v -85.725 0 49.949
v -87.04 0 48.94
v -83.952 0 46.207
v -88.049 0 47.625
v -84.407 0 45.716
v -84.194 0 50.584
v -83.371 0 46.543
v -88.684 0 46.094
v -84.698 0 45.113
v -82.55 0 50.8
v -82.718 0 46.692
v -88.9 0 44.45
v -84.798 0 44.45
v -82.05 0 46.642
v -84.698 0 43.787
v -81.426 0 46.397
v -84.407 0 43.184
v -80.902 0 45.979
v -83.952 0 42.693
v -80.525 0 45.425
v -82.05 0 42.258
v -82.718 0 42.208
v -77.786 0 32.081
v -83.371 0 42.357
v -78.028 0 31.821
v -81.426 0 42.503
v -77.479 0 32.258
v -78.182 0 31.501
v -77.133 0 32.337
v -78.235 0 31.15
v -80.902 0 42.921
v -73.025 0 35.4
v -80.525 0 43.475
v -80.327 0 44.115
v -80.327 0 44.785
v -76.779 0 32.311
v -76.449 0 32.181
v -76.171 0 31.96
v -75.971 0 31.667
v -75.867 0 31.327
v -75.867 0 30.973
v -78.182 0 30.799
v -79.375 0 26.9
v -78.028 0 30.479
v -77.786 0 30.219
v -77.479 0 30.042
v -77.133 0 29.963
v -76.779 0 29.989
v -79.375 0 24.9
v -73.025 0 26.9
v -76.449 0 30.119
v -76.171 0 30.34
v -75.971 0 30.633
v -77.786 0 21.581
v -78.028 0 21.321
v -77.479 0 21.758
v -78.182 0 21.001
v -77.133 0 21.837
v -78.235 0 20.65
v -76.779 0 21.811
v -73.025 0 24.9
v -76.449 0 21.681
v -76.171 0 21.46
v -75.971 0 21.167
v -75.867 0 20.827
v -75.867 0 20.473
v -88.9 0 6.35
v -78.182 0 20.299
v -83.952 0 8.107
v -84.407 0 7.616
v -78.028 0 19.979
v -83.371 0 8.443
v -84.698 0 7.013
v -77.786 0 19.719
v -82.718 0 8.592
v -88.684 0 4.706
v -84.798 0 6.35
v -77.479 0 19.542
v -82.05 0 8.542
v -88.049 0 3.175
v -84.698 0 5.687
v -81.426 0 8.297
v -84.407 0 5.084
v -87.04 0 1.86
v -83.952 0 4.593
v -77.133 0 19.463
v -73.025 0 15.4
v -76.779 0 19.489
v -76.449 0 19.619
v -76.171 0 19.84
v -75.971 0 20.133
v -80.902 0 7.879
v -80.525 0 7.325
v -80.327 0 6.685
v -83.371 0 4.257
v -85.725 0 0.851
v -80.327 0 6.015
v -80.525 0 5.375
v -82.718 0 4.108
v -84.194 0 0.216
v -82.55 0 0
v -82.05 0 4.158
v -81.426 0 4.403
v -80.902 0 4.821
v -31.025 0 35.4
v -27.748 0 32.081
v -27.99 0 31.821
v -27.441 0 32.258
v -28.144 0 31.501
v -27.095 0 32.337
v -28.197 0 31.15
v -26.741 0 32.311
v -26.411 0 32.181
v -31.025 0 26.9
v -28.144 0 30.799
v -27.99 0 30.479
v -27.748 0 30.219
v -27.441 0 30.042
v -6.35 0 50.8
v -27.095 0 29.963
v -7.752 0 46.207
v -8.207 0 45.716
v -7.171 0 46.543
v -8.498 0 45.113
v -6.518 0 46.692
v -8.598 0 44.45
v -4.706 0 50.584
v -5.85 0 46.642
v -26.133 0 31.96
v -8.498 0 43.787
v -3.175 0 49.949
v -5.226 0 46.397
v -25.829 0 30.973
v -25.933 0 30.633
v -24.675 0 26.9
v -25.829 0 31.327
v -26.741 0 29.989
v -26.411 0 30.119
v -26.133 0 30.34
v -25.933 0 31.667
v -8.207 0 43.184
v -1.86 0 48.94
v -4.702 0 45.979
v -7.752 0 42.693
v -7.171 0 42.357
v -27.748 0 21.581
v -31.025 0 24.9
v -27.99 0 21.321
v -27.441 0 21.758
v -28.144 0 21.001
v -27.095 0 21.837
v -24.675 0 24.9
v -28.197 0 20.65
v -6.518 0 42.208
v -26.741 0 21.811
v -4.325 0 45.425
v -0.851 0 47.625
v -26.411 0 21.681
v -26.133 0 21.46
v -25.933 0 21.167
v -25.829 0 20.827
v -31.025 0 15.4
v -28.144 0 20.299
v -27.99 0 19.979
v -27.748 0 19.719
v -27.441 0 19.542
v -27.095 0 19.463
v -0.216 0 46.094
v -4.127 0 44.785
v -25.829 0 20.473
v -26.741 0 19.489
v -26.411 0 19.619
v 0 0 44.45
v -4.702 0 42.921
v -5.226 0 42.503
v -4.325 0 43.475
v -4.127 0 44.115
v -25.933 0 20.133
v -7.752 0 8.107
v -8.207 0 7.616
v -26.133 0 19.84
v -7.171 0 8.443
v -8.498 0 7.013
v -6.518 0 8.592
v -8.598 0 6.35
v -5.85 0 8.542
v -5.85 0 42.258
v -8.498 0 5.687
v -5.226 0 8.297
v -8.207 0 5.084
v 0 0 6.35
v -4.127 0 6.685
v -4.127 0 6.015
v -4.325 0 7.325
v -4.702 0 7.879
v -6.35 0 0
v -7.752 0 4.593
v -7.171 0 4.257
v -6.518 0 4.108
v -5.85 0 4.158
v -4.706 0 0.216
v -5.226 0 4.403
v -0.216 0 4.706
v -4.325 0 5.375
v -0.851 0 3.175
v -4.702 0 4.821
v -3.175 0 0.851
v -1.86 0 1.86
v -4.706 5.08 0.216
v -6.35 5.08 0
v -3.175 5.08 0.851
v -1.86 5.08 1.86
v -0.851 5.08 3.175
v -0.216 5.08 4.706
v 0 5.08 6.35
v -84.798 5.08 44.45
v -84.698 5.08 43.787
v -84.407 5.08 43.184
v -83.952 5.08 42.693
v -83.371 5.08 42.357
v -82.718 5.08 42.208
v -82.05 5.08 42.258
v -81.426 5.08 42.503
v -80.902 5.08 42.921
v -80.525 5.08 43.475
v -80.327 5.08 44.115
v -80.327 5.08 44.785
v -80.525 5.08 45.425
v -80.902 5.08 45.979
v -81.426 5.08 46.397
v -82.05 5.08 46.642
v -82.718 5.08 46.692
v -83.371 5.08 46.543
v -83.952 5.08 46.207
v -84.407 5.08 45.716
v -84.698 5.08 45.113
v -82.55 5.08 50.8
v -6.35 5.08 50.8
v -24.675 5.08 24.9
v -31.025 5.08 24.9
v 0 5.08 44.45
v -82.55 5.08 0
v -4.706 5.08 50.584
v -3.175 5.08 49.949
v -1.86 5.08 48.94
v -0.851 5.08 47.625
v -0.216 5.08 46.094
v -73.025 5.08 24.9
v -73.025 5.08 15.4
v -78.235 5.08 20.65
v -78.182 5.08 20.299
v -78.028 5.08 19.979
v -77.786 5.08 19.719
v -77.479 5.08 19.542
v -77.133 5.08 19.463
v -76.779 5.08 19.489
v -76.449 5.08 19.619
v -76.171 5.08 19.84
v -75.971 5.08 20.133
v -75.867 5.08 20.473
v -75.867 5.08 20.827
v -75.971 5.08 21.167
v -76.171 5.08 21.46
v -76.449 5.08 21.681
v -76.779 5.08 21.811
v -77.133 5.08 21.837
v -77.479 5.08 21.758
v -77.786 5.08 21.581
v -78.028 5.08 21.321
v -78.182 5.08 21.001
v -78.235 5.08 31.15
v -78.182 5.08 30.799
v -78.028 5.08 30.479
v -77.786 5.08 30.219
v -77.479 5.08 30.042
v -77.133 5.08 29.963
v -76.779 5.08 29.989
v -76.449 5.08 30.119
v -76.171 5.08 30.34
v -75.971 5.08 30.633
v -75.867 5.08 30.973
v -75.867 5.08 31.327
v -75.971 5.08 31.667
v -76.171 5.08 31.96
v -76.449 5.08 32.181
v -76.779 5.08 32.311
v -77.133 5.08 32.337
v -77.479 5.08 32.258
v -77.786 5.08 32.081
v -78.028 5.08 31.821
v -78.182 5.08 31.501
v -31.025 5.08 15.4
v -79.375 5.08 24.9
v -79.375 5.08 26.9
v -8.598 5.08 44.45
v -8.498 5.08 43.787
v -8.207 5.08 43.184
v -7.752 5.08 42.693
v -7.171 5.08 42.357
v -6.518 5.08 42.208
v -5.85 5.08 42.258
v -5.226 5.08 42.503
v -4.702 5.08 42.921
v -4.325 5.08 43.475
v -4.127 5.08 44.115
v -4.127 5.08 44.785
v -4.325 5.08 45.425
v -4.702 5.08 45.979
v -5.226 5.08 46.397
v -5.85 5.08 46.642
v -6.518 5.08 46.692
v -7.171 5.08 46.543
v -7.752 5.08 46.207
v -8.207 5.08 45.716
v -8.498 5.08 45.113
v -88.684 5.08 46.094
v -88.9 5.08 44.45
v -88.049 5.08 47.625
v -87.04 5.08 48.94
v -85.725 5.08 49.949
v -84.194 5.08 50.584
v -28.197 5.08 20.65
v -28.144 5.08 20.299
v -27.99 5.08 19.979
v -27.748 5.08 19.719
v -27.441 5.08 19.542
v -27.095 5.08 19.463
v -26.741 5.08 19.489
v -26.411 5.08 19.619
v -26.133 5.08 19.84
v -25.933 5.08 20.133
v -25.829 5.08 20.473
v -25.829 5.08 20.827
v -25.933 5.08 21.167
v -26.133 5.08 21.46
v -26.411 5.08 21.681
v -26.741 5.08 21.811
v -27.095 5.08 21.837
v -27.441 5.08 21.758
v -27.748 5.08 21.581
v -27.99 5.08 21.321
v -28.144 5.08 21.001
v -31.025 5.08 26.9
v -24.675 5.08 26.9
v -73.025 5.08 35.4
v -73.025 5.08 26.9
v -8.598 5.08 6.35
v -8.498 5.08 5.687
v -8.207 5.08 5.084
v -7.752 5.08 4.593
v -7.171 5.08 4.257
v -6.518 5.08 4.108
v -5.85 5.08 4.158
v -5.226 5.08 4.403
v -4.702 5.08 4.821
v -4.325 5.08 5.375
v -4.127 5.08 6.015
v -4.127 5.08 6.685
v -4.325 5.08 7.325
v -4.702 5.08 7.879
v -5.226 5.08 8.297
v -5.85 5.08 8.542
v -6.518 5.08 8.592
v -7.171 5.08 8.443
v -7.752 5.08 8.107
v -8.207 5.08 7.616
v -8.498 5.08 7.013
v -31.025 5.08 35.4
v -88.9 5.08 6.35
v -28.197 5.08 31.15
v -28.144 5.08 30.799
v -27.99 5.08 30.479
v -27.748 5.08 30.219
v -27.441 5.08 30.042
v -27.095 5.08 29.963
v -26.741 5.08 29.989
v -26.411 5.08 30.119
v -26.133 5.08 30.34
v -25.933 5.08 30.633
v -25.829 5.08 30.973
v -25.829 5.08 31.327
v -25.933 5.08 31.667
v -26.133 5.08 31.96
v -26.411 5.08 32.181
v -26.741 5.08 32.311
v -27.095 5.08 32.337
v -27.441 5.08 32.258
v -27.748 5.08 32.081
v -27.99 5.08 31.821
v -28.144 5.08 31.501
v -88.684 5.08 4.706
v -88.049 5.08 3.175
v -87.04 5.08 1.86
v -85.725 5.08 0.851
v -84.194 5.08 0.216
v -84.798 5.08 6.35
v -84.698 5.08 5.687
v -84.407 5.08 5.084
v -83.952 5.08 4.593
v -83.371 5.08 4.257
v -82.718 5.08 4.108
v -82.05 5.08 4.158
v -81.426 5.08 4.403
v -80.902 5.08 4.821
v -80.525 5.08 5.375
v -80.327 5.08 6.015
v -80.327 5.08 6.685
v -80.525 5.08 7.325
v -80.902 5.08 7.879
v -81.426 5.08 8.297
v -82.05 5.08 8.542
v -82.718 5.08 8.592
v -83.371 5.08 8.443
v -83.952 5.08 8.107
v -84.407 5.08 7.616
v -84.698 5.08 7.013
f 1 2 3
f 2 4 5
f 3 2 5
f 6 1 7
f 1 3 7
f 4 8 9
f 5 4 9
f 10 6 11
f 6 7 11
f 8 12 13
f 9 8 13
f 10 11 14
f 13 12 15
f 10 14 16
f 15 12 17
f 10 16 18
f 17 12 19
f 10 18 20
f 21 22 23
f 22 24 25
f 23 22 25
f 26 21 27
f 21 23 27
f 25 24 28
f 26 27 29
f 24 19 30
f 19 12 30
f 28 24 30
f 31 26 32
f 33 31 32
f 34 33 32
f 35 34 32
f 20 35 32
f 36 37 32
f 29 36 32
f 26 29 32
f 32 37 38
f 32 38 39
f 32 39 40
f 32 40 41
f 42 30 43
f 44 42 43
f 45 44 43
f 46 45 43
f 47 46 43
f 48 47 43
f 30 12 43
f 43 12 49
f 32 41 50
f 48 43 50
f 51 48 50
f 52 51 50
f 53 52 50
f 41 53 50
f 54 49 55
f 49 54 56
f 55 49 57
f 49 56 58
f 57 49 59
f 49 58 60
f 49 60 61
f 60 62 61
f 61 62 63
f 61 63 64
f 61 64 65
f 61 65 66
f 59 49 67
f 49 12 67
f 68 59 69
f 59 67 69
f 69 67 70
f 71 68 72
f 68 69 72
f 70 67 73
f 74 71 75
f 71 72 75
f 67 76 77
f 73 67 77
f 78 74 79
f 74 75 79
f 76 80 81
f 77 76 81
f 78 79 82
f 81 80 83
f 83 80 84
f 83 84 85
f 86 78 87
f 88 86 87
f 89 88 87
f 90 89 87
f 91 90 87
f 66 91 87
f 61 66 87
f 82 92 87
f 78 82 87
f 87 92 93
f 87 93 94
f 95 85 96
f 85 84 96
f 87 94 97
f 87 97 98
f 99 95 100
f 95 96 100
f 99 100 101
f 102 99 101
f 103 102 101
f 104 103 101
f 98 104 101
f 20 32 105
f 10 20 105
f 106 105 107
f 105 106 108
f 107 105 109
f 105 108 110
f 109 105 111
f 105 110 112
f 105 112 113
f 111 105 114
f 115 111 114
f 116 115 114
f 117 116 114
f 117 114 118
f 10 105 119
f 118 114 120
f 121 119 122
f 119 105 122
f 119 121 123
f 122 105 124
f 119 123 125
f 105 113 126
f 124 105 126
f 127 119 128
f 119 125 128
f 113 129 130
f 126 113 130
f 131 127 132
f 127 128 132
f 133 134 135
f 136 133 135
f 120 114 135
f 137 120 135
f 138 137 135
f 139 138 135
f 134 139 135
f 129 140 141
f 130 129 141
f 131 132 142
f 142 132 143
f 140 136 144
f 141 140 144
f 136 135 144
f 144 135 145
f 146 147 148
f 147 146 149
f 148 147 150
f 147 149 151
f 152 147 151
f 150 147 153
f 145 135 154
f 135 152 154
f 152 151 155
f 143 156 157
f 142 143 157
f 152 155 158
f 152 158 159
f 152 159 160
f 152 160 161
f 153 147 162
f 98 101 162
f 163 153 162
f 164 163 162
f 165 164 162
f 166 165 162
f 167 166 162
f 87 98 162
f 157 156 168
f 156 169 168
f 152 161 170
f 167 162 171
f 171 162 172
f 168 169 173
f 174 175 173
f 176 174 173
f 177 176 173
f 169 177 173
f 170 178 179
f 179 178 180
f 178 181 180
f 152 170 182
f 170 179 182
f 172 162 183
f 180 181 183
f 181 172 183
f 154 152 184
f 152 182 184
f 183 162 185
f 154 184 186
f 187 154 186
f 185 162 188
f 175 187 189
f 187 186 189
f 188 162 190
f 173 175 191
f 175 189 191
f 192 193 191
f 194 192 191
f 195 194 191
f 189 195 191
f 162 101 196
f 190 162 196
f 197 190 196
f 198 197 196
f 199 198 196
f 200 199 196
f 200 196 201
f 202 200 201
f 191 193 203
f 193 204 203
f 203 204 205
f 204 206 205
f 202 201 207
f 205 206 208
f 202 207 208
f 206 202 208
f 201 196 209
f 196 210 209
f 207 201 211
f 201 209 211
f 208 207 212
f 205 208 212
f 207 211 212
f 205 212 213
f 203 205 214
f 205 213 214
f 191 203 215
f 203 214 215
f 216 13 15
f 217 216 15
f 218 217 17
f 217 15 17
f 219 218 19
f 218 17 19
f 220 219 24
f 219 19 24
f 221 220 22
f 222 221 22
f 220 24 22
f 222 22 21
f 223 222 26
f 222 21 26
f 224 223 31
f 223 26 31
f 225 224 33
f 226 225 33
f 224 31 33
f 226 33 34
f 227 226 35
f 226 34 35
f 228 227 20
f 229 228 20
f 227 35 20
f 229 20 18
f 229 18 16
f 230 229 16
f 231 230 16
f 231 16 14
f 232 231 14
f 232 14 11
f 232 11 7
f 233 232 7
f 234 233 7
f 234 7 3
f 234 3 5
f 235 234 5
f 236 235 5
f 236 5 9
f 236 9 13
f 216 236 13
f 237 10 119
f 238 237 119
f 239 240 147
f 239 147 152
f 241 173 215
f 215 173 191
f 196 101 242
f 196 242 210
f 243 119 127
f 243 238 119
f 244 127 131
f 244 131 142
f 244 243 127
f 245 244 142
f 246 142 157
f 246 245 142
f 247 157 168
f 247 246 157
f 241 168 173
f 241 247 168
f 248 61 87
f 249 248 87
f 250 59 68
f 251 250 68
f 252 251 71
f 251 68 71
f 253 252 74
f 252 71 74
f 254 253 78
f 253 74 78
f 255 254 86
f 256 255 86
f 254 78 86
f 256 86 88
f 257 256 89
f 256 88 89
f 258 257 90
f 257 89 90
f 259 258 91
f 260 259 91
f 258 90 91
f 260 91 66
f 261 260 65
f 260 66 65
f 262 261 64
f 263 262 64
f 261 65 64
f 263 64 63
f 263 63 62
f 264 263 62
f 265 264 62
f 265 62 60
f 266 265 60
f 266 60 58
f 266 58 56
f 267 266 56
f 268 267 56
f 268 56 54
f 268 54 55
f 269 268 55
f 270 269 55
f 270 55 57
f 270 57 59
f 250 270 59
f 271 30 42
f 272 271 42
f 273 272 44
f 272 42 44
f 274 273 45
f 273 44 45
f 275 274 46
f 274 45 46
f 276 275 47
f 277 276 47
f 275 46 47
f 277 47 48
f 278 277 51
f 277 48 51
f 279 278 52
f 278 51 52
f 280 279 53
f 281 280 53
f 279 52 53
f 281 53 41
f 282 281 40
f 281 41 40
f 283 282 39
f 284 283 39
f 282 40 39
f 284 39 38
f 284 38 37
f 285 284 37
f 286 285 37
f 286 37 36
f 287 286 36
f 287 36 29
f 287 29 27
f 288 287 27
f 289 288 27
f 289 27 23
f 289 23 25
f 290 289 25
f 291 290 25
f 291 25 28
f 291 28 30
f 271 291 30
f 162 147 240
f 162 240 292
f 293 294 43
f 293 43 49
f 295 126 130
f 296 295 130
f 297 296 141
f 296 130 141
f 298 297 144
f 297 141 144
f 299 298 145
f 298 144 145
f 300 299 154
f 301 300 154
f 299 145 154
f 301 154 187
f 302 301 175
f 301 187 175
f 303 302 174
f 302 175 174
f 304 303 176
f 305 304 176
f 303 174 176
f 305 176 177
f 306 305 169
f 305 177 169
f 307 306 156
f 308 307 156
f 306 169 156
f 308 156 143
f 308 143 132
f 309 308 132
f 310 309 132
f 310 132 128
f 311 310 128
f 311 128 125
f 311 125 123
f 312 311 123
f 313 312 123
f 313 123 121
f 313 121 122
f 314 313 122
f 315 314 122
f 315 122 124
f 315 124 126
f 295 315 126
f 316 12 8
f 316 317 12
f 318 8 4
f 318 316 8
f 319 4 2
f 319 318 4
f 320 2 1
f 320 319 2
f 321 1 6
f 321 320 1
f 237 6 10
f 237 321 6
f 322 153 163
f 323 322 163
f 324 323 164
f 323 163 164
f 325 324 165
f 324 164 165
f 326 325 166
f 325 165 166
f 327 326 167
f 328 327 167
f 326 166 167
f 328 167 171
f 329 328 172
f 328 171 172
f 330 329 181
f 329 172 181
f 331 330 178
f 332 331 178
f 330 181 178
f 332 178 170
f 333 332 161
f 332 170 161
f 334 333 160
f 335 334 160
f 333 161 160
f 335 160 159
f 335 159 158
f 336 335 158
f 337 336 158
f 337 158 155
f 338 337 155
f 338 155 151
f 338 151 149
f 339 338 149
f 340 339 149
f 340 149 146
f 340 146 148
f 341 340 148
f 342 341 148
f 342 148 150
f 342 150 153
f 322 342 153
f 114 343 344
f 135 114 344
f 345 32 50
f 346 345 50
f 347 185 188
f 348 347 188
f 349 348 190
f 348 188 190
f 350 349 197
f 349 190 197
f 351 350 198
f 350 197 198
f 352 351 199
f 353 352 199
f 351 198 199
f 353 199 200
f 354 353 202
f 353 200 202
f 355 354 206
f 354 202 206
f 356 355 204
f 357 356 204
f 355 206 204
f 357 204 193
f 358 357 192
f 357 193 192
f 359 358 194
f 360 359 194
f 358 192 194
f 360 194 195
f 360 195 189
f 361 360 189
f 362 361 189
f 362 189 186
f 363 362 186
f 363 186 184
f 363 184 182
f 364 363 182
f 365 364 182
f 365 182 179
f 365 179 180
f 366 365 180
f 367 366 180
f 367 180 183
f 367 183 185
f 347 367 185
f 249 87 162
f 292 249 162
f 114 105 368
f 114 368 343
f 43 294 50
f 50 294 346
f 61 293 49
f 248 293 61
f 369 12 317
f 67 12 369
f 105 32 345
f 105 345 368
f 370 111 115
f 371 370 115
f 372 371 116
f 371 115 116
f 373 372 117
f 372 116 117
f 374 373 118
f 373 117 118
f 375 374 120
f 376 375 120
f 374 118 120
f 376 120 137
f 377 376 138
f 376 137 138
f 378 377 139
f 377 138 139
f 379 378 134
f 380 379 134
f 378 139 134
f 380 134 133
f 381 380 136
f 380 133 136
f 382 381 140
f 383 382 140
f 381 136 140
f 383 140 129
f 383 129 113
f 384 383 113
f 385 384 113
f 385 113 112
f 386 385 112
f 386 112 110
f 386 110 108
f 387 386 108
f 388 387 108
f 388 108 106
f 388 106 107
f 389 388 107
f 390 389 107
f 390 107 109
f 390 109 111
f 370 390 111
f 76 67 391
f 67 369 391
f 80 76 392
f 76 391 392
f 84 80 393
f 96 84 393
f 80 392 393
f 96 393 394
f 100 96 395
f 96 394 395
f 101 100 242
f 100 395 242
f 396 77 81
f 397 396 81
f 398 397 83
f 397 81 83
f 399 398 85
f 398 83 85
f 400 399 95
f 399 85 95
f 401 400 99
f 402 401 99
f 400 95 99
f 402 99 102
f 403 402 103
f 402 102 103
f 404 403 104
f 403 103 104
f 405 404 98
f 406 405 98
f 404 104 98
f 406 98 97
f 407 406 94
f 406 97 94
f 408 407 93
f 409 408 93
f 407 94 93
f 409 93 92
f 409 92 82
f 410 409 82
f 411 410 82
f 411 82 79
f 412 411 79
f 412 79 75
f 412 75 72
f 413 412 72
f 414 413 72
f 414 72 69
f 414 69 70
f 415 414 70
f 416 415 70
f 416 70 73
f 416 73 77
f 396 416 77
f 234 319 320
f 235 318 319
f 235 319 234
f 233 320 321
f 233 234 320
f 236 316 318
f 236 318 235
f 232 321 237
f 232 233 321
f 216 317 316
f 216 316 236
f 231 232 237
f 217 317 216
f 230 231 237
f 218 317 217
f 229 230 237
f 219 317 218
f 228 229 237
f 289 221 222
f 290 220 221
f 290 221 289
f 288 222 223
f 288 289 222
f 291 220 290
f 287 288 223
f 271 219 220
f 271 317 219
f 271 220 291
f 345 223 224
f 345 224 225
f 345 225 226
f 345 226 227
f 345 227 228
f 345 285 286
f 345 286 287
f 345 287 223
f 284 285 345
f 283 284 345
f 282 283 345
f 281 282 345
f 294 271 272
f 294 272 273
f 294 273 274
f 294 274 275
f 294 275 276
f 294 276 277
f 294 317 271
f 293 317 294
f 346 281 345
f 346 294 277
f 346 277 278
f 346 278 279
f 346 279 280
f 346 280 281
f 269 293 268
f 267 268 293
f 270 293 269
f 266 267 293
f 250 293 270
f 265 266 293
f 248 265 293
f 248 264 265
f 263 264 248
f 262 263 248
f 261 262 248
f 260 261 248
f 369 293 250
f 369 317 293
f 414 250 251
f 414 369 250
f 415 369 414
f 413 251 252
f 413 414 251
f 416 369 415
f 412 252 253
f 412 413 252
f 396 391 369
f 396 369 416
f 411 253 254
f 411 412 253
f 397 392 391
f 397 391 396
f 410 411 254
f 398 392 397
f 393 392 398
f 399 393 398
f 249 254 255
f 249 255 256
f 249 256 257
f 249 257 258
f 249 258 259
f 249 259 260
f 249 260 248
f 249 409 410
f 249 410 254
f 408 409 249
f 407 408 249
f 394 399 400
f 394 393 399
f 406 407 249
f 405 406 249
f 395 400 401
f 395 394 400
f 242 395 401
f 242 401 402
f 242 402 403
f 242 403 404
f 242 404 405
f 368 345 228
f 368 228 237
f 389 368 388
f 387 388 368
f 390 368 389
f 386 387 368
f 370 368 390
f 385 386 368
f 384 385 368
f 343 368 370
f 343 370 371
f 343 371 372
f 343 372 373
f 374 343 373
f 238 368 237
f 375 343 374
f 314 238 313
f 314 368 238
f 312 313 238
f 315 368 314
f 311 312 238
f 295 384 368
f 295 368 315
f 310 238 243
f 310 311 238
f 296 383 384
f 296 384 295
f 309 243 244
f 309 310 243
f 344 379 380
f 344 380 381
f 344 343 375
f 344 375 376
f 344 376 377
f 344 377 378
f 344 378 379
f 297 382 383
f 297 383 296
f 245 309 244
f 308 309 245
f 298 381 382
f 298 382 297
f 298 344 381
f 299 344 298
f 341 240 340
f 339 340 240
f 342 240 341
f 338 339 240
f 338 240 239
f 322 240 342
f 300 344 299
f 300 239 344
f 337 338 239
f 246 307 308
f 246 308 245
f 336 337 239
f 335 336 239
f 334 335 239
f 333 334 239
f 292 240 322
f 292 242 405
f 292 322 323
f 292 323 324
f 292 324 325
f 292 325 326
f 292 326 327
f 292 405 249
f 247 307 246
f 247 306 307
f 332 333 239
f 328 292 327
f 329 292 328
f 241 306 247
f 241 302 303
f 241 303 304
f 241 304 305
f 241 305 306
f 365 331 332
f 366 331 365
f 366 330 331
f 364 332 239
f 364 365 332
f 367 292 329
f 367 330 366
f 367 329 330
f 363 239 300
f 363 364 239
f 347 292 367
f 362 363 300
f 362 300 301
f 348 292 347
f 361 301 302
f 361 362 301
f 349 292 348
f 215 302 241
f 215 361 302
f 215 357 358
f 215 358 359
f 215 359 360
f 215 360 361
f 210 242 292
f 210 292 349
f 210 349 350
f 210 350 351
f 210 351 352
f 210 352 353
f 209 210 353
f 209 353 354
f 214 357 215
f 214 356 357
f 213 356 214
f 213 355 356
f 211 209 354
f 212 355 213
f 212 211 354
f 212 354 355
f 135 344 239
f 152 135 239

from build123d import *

# Parameters (mm, degrees)
SKETCH1_W                       = 88.9
SKETCH1_H                       = 50.8
SKETCH1_W_2                     = 42.0000176
SKETCH1_H_2                     = 20
BOSS_EXTRUDE1_DEPTH             = 5.08
F_3_32_0_09375_DIAMETER_HOLE1_D = 2.38125
SKETCH4_W                       = 6.35
SKETCH4_H                       = 2
CUT_EXTRUDE1_DEPTH              = 6.08
FILLET2_R                       = 6.35
F_8_CLEARANCE_HOLE1_D           = 4.4958


with BuildPart() as part:
    # Sketch1 → Boss-Extrude1 (new body)
    with BuildSketch(Plane(origin=(0, 0, 0), x_dir=(1, 0, 0), z_dir=(0, 1, 0))):
        with Locations((-44.45, -25.4)):
            Rectangle(SKETCH1_W, SKETCH1_H)
        with Locations((-52.0249912, -25.4)):
            Rectangle(SKETCH1_W_2, SKETCH1_H_2, mode=Mode.SUBTRACT)
    extrude(amount=BOSS_EXTRUDE1_DEPTH)

    # 3/32 (0.09375) Diameter Hole1 (through all)
    with Locations(Plane(origin=(0, 5.08, 0), x_dir=(1, 0, 0), z_dir=(0, 1, 0))):
        with Locations((-77.0439912, -31.15), (-77.0439912, -20.65), (-27.0059912, -31.15), (-27.0059912, -20.65)):
            Hole(F_3_32_0_09375_DIAMETER_HOLE1_D / 2)

    # Sketch4 → Cut-Extrude1 (cut, through all)
    with BuildSketch(Plane(origin=(0, 5.08, 0), x_dir=(1, 0, 0), z_dir=(0, 1, 0))):
        with Locations((-76.2, -25.9)):
            Rectangle(SKETCH4_W, SKETCH4_H)
        with Locations((-27.8499824, -25.9)):
            Rectangle(SKETCH4_W, SKETCH4_H)
    extrude(amount=-CUT_EXTRUDE1_DEPTH, mode=Mode.SUBTRACT)

    # Fillet2
    fillet2_edges = [part.edges().sort_by_distance(p)[0] for p in [
        (-88.9, 2.54, 0),
        (0, 2.54, 0),
        (0, 2.54, 50.8),
        (-88.9, 2.54, 50.8),
    ]]
    fillet(fillet2_edges, radius=FILLET2_R)

    # #8 Clearance Hole1 (through all)
    with Locations(Plane(origin=(0, 5.08, 0), x_dir=(1, 0, 0), z_dir=(0, 1, 0))):
        with Locations((-82.55, -6.35), (-82.55, -44.45), (-6.35, -6.35), (-6.35, -44.45)):
            Hole(F_8_CLEARANCE_HOLE1_D / 2)


solid = part.part
